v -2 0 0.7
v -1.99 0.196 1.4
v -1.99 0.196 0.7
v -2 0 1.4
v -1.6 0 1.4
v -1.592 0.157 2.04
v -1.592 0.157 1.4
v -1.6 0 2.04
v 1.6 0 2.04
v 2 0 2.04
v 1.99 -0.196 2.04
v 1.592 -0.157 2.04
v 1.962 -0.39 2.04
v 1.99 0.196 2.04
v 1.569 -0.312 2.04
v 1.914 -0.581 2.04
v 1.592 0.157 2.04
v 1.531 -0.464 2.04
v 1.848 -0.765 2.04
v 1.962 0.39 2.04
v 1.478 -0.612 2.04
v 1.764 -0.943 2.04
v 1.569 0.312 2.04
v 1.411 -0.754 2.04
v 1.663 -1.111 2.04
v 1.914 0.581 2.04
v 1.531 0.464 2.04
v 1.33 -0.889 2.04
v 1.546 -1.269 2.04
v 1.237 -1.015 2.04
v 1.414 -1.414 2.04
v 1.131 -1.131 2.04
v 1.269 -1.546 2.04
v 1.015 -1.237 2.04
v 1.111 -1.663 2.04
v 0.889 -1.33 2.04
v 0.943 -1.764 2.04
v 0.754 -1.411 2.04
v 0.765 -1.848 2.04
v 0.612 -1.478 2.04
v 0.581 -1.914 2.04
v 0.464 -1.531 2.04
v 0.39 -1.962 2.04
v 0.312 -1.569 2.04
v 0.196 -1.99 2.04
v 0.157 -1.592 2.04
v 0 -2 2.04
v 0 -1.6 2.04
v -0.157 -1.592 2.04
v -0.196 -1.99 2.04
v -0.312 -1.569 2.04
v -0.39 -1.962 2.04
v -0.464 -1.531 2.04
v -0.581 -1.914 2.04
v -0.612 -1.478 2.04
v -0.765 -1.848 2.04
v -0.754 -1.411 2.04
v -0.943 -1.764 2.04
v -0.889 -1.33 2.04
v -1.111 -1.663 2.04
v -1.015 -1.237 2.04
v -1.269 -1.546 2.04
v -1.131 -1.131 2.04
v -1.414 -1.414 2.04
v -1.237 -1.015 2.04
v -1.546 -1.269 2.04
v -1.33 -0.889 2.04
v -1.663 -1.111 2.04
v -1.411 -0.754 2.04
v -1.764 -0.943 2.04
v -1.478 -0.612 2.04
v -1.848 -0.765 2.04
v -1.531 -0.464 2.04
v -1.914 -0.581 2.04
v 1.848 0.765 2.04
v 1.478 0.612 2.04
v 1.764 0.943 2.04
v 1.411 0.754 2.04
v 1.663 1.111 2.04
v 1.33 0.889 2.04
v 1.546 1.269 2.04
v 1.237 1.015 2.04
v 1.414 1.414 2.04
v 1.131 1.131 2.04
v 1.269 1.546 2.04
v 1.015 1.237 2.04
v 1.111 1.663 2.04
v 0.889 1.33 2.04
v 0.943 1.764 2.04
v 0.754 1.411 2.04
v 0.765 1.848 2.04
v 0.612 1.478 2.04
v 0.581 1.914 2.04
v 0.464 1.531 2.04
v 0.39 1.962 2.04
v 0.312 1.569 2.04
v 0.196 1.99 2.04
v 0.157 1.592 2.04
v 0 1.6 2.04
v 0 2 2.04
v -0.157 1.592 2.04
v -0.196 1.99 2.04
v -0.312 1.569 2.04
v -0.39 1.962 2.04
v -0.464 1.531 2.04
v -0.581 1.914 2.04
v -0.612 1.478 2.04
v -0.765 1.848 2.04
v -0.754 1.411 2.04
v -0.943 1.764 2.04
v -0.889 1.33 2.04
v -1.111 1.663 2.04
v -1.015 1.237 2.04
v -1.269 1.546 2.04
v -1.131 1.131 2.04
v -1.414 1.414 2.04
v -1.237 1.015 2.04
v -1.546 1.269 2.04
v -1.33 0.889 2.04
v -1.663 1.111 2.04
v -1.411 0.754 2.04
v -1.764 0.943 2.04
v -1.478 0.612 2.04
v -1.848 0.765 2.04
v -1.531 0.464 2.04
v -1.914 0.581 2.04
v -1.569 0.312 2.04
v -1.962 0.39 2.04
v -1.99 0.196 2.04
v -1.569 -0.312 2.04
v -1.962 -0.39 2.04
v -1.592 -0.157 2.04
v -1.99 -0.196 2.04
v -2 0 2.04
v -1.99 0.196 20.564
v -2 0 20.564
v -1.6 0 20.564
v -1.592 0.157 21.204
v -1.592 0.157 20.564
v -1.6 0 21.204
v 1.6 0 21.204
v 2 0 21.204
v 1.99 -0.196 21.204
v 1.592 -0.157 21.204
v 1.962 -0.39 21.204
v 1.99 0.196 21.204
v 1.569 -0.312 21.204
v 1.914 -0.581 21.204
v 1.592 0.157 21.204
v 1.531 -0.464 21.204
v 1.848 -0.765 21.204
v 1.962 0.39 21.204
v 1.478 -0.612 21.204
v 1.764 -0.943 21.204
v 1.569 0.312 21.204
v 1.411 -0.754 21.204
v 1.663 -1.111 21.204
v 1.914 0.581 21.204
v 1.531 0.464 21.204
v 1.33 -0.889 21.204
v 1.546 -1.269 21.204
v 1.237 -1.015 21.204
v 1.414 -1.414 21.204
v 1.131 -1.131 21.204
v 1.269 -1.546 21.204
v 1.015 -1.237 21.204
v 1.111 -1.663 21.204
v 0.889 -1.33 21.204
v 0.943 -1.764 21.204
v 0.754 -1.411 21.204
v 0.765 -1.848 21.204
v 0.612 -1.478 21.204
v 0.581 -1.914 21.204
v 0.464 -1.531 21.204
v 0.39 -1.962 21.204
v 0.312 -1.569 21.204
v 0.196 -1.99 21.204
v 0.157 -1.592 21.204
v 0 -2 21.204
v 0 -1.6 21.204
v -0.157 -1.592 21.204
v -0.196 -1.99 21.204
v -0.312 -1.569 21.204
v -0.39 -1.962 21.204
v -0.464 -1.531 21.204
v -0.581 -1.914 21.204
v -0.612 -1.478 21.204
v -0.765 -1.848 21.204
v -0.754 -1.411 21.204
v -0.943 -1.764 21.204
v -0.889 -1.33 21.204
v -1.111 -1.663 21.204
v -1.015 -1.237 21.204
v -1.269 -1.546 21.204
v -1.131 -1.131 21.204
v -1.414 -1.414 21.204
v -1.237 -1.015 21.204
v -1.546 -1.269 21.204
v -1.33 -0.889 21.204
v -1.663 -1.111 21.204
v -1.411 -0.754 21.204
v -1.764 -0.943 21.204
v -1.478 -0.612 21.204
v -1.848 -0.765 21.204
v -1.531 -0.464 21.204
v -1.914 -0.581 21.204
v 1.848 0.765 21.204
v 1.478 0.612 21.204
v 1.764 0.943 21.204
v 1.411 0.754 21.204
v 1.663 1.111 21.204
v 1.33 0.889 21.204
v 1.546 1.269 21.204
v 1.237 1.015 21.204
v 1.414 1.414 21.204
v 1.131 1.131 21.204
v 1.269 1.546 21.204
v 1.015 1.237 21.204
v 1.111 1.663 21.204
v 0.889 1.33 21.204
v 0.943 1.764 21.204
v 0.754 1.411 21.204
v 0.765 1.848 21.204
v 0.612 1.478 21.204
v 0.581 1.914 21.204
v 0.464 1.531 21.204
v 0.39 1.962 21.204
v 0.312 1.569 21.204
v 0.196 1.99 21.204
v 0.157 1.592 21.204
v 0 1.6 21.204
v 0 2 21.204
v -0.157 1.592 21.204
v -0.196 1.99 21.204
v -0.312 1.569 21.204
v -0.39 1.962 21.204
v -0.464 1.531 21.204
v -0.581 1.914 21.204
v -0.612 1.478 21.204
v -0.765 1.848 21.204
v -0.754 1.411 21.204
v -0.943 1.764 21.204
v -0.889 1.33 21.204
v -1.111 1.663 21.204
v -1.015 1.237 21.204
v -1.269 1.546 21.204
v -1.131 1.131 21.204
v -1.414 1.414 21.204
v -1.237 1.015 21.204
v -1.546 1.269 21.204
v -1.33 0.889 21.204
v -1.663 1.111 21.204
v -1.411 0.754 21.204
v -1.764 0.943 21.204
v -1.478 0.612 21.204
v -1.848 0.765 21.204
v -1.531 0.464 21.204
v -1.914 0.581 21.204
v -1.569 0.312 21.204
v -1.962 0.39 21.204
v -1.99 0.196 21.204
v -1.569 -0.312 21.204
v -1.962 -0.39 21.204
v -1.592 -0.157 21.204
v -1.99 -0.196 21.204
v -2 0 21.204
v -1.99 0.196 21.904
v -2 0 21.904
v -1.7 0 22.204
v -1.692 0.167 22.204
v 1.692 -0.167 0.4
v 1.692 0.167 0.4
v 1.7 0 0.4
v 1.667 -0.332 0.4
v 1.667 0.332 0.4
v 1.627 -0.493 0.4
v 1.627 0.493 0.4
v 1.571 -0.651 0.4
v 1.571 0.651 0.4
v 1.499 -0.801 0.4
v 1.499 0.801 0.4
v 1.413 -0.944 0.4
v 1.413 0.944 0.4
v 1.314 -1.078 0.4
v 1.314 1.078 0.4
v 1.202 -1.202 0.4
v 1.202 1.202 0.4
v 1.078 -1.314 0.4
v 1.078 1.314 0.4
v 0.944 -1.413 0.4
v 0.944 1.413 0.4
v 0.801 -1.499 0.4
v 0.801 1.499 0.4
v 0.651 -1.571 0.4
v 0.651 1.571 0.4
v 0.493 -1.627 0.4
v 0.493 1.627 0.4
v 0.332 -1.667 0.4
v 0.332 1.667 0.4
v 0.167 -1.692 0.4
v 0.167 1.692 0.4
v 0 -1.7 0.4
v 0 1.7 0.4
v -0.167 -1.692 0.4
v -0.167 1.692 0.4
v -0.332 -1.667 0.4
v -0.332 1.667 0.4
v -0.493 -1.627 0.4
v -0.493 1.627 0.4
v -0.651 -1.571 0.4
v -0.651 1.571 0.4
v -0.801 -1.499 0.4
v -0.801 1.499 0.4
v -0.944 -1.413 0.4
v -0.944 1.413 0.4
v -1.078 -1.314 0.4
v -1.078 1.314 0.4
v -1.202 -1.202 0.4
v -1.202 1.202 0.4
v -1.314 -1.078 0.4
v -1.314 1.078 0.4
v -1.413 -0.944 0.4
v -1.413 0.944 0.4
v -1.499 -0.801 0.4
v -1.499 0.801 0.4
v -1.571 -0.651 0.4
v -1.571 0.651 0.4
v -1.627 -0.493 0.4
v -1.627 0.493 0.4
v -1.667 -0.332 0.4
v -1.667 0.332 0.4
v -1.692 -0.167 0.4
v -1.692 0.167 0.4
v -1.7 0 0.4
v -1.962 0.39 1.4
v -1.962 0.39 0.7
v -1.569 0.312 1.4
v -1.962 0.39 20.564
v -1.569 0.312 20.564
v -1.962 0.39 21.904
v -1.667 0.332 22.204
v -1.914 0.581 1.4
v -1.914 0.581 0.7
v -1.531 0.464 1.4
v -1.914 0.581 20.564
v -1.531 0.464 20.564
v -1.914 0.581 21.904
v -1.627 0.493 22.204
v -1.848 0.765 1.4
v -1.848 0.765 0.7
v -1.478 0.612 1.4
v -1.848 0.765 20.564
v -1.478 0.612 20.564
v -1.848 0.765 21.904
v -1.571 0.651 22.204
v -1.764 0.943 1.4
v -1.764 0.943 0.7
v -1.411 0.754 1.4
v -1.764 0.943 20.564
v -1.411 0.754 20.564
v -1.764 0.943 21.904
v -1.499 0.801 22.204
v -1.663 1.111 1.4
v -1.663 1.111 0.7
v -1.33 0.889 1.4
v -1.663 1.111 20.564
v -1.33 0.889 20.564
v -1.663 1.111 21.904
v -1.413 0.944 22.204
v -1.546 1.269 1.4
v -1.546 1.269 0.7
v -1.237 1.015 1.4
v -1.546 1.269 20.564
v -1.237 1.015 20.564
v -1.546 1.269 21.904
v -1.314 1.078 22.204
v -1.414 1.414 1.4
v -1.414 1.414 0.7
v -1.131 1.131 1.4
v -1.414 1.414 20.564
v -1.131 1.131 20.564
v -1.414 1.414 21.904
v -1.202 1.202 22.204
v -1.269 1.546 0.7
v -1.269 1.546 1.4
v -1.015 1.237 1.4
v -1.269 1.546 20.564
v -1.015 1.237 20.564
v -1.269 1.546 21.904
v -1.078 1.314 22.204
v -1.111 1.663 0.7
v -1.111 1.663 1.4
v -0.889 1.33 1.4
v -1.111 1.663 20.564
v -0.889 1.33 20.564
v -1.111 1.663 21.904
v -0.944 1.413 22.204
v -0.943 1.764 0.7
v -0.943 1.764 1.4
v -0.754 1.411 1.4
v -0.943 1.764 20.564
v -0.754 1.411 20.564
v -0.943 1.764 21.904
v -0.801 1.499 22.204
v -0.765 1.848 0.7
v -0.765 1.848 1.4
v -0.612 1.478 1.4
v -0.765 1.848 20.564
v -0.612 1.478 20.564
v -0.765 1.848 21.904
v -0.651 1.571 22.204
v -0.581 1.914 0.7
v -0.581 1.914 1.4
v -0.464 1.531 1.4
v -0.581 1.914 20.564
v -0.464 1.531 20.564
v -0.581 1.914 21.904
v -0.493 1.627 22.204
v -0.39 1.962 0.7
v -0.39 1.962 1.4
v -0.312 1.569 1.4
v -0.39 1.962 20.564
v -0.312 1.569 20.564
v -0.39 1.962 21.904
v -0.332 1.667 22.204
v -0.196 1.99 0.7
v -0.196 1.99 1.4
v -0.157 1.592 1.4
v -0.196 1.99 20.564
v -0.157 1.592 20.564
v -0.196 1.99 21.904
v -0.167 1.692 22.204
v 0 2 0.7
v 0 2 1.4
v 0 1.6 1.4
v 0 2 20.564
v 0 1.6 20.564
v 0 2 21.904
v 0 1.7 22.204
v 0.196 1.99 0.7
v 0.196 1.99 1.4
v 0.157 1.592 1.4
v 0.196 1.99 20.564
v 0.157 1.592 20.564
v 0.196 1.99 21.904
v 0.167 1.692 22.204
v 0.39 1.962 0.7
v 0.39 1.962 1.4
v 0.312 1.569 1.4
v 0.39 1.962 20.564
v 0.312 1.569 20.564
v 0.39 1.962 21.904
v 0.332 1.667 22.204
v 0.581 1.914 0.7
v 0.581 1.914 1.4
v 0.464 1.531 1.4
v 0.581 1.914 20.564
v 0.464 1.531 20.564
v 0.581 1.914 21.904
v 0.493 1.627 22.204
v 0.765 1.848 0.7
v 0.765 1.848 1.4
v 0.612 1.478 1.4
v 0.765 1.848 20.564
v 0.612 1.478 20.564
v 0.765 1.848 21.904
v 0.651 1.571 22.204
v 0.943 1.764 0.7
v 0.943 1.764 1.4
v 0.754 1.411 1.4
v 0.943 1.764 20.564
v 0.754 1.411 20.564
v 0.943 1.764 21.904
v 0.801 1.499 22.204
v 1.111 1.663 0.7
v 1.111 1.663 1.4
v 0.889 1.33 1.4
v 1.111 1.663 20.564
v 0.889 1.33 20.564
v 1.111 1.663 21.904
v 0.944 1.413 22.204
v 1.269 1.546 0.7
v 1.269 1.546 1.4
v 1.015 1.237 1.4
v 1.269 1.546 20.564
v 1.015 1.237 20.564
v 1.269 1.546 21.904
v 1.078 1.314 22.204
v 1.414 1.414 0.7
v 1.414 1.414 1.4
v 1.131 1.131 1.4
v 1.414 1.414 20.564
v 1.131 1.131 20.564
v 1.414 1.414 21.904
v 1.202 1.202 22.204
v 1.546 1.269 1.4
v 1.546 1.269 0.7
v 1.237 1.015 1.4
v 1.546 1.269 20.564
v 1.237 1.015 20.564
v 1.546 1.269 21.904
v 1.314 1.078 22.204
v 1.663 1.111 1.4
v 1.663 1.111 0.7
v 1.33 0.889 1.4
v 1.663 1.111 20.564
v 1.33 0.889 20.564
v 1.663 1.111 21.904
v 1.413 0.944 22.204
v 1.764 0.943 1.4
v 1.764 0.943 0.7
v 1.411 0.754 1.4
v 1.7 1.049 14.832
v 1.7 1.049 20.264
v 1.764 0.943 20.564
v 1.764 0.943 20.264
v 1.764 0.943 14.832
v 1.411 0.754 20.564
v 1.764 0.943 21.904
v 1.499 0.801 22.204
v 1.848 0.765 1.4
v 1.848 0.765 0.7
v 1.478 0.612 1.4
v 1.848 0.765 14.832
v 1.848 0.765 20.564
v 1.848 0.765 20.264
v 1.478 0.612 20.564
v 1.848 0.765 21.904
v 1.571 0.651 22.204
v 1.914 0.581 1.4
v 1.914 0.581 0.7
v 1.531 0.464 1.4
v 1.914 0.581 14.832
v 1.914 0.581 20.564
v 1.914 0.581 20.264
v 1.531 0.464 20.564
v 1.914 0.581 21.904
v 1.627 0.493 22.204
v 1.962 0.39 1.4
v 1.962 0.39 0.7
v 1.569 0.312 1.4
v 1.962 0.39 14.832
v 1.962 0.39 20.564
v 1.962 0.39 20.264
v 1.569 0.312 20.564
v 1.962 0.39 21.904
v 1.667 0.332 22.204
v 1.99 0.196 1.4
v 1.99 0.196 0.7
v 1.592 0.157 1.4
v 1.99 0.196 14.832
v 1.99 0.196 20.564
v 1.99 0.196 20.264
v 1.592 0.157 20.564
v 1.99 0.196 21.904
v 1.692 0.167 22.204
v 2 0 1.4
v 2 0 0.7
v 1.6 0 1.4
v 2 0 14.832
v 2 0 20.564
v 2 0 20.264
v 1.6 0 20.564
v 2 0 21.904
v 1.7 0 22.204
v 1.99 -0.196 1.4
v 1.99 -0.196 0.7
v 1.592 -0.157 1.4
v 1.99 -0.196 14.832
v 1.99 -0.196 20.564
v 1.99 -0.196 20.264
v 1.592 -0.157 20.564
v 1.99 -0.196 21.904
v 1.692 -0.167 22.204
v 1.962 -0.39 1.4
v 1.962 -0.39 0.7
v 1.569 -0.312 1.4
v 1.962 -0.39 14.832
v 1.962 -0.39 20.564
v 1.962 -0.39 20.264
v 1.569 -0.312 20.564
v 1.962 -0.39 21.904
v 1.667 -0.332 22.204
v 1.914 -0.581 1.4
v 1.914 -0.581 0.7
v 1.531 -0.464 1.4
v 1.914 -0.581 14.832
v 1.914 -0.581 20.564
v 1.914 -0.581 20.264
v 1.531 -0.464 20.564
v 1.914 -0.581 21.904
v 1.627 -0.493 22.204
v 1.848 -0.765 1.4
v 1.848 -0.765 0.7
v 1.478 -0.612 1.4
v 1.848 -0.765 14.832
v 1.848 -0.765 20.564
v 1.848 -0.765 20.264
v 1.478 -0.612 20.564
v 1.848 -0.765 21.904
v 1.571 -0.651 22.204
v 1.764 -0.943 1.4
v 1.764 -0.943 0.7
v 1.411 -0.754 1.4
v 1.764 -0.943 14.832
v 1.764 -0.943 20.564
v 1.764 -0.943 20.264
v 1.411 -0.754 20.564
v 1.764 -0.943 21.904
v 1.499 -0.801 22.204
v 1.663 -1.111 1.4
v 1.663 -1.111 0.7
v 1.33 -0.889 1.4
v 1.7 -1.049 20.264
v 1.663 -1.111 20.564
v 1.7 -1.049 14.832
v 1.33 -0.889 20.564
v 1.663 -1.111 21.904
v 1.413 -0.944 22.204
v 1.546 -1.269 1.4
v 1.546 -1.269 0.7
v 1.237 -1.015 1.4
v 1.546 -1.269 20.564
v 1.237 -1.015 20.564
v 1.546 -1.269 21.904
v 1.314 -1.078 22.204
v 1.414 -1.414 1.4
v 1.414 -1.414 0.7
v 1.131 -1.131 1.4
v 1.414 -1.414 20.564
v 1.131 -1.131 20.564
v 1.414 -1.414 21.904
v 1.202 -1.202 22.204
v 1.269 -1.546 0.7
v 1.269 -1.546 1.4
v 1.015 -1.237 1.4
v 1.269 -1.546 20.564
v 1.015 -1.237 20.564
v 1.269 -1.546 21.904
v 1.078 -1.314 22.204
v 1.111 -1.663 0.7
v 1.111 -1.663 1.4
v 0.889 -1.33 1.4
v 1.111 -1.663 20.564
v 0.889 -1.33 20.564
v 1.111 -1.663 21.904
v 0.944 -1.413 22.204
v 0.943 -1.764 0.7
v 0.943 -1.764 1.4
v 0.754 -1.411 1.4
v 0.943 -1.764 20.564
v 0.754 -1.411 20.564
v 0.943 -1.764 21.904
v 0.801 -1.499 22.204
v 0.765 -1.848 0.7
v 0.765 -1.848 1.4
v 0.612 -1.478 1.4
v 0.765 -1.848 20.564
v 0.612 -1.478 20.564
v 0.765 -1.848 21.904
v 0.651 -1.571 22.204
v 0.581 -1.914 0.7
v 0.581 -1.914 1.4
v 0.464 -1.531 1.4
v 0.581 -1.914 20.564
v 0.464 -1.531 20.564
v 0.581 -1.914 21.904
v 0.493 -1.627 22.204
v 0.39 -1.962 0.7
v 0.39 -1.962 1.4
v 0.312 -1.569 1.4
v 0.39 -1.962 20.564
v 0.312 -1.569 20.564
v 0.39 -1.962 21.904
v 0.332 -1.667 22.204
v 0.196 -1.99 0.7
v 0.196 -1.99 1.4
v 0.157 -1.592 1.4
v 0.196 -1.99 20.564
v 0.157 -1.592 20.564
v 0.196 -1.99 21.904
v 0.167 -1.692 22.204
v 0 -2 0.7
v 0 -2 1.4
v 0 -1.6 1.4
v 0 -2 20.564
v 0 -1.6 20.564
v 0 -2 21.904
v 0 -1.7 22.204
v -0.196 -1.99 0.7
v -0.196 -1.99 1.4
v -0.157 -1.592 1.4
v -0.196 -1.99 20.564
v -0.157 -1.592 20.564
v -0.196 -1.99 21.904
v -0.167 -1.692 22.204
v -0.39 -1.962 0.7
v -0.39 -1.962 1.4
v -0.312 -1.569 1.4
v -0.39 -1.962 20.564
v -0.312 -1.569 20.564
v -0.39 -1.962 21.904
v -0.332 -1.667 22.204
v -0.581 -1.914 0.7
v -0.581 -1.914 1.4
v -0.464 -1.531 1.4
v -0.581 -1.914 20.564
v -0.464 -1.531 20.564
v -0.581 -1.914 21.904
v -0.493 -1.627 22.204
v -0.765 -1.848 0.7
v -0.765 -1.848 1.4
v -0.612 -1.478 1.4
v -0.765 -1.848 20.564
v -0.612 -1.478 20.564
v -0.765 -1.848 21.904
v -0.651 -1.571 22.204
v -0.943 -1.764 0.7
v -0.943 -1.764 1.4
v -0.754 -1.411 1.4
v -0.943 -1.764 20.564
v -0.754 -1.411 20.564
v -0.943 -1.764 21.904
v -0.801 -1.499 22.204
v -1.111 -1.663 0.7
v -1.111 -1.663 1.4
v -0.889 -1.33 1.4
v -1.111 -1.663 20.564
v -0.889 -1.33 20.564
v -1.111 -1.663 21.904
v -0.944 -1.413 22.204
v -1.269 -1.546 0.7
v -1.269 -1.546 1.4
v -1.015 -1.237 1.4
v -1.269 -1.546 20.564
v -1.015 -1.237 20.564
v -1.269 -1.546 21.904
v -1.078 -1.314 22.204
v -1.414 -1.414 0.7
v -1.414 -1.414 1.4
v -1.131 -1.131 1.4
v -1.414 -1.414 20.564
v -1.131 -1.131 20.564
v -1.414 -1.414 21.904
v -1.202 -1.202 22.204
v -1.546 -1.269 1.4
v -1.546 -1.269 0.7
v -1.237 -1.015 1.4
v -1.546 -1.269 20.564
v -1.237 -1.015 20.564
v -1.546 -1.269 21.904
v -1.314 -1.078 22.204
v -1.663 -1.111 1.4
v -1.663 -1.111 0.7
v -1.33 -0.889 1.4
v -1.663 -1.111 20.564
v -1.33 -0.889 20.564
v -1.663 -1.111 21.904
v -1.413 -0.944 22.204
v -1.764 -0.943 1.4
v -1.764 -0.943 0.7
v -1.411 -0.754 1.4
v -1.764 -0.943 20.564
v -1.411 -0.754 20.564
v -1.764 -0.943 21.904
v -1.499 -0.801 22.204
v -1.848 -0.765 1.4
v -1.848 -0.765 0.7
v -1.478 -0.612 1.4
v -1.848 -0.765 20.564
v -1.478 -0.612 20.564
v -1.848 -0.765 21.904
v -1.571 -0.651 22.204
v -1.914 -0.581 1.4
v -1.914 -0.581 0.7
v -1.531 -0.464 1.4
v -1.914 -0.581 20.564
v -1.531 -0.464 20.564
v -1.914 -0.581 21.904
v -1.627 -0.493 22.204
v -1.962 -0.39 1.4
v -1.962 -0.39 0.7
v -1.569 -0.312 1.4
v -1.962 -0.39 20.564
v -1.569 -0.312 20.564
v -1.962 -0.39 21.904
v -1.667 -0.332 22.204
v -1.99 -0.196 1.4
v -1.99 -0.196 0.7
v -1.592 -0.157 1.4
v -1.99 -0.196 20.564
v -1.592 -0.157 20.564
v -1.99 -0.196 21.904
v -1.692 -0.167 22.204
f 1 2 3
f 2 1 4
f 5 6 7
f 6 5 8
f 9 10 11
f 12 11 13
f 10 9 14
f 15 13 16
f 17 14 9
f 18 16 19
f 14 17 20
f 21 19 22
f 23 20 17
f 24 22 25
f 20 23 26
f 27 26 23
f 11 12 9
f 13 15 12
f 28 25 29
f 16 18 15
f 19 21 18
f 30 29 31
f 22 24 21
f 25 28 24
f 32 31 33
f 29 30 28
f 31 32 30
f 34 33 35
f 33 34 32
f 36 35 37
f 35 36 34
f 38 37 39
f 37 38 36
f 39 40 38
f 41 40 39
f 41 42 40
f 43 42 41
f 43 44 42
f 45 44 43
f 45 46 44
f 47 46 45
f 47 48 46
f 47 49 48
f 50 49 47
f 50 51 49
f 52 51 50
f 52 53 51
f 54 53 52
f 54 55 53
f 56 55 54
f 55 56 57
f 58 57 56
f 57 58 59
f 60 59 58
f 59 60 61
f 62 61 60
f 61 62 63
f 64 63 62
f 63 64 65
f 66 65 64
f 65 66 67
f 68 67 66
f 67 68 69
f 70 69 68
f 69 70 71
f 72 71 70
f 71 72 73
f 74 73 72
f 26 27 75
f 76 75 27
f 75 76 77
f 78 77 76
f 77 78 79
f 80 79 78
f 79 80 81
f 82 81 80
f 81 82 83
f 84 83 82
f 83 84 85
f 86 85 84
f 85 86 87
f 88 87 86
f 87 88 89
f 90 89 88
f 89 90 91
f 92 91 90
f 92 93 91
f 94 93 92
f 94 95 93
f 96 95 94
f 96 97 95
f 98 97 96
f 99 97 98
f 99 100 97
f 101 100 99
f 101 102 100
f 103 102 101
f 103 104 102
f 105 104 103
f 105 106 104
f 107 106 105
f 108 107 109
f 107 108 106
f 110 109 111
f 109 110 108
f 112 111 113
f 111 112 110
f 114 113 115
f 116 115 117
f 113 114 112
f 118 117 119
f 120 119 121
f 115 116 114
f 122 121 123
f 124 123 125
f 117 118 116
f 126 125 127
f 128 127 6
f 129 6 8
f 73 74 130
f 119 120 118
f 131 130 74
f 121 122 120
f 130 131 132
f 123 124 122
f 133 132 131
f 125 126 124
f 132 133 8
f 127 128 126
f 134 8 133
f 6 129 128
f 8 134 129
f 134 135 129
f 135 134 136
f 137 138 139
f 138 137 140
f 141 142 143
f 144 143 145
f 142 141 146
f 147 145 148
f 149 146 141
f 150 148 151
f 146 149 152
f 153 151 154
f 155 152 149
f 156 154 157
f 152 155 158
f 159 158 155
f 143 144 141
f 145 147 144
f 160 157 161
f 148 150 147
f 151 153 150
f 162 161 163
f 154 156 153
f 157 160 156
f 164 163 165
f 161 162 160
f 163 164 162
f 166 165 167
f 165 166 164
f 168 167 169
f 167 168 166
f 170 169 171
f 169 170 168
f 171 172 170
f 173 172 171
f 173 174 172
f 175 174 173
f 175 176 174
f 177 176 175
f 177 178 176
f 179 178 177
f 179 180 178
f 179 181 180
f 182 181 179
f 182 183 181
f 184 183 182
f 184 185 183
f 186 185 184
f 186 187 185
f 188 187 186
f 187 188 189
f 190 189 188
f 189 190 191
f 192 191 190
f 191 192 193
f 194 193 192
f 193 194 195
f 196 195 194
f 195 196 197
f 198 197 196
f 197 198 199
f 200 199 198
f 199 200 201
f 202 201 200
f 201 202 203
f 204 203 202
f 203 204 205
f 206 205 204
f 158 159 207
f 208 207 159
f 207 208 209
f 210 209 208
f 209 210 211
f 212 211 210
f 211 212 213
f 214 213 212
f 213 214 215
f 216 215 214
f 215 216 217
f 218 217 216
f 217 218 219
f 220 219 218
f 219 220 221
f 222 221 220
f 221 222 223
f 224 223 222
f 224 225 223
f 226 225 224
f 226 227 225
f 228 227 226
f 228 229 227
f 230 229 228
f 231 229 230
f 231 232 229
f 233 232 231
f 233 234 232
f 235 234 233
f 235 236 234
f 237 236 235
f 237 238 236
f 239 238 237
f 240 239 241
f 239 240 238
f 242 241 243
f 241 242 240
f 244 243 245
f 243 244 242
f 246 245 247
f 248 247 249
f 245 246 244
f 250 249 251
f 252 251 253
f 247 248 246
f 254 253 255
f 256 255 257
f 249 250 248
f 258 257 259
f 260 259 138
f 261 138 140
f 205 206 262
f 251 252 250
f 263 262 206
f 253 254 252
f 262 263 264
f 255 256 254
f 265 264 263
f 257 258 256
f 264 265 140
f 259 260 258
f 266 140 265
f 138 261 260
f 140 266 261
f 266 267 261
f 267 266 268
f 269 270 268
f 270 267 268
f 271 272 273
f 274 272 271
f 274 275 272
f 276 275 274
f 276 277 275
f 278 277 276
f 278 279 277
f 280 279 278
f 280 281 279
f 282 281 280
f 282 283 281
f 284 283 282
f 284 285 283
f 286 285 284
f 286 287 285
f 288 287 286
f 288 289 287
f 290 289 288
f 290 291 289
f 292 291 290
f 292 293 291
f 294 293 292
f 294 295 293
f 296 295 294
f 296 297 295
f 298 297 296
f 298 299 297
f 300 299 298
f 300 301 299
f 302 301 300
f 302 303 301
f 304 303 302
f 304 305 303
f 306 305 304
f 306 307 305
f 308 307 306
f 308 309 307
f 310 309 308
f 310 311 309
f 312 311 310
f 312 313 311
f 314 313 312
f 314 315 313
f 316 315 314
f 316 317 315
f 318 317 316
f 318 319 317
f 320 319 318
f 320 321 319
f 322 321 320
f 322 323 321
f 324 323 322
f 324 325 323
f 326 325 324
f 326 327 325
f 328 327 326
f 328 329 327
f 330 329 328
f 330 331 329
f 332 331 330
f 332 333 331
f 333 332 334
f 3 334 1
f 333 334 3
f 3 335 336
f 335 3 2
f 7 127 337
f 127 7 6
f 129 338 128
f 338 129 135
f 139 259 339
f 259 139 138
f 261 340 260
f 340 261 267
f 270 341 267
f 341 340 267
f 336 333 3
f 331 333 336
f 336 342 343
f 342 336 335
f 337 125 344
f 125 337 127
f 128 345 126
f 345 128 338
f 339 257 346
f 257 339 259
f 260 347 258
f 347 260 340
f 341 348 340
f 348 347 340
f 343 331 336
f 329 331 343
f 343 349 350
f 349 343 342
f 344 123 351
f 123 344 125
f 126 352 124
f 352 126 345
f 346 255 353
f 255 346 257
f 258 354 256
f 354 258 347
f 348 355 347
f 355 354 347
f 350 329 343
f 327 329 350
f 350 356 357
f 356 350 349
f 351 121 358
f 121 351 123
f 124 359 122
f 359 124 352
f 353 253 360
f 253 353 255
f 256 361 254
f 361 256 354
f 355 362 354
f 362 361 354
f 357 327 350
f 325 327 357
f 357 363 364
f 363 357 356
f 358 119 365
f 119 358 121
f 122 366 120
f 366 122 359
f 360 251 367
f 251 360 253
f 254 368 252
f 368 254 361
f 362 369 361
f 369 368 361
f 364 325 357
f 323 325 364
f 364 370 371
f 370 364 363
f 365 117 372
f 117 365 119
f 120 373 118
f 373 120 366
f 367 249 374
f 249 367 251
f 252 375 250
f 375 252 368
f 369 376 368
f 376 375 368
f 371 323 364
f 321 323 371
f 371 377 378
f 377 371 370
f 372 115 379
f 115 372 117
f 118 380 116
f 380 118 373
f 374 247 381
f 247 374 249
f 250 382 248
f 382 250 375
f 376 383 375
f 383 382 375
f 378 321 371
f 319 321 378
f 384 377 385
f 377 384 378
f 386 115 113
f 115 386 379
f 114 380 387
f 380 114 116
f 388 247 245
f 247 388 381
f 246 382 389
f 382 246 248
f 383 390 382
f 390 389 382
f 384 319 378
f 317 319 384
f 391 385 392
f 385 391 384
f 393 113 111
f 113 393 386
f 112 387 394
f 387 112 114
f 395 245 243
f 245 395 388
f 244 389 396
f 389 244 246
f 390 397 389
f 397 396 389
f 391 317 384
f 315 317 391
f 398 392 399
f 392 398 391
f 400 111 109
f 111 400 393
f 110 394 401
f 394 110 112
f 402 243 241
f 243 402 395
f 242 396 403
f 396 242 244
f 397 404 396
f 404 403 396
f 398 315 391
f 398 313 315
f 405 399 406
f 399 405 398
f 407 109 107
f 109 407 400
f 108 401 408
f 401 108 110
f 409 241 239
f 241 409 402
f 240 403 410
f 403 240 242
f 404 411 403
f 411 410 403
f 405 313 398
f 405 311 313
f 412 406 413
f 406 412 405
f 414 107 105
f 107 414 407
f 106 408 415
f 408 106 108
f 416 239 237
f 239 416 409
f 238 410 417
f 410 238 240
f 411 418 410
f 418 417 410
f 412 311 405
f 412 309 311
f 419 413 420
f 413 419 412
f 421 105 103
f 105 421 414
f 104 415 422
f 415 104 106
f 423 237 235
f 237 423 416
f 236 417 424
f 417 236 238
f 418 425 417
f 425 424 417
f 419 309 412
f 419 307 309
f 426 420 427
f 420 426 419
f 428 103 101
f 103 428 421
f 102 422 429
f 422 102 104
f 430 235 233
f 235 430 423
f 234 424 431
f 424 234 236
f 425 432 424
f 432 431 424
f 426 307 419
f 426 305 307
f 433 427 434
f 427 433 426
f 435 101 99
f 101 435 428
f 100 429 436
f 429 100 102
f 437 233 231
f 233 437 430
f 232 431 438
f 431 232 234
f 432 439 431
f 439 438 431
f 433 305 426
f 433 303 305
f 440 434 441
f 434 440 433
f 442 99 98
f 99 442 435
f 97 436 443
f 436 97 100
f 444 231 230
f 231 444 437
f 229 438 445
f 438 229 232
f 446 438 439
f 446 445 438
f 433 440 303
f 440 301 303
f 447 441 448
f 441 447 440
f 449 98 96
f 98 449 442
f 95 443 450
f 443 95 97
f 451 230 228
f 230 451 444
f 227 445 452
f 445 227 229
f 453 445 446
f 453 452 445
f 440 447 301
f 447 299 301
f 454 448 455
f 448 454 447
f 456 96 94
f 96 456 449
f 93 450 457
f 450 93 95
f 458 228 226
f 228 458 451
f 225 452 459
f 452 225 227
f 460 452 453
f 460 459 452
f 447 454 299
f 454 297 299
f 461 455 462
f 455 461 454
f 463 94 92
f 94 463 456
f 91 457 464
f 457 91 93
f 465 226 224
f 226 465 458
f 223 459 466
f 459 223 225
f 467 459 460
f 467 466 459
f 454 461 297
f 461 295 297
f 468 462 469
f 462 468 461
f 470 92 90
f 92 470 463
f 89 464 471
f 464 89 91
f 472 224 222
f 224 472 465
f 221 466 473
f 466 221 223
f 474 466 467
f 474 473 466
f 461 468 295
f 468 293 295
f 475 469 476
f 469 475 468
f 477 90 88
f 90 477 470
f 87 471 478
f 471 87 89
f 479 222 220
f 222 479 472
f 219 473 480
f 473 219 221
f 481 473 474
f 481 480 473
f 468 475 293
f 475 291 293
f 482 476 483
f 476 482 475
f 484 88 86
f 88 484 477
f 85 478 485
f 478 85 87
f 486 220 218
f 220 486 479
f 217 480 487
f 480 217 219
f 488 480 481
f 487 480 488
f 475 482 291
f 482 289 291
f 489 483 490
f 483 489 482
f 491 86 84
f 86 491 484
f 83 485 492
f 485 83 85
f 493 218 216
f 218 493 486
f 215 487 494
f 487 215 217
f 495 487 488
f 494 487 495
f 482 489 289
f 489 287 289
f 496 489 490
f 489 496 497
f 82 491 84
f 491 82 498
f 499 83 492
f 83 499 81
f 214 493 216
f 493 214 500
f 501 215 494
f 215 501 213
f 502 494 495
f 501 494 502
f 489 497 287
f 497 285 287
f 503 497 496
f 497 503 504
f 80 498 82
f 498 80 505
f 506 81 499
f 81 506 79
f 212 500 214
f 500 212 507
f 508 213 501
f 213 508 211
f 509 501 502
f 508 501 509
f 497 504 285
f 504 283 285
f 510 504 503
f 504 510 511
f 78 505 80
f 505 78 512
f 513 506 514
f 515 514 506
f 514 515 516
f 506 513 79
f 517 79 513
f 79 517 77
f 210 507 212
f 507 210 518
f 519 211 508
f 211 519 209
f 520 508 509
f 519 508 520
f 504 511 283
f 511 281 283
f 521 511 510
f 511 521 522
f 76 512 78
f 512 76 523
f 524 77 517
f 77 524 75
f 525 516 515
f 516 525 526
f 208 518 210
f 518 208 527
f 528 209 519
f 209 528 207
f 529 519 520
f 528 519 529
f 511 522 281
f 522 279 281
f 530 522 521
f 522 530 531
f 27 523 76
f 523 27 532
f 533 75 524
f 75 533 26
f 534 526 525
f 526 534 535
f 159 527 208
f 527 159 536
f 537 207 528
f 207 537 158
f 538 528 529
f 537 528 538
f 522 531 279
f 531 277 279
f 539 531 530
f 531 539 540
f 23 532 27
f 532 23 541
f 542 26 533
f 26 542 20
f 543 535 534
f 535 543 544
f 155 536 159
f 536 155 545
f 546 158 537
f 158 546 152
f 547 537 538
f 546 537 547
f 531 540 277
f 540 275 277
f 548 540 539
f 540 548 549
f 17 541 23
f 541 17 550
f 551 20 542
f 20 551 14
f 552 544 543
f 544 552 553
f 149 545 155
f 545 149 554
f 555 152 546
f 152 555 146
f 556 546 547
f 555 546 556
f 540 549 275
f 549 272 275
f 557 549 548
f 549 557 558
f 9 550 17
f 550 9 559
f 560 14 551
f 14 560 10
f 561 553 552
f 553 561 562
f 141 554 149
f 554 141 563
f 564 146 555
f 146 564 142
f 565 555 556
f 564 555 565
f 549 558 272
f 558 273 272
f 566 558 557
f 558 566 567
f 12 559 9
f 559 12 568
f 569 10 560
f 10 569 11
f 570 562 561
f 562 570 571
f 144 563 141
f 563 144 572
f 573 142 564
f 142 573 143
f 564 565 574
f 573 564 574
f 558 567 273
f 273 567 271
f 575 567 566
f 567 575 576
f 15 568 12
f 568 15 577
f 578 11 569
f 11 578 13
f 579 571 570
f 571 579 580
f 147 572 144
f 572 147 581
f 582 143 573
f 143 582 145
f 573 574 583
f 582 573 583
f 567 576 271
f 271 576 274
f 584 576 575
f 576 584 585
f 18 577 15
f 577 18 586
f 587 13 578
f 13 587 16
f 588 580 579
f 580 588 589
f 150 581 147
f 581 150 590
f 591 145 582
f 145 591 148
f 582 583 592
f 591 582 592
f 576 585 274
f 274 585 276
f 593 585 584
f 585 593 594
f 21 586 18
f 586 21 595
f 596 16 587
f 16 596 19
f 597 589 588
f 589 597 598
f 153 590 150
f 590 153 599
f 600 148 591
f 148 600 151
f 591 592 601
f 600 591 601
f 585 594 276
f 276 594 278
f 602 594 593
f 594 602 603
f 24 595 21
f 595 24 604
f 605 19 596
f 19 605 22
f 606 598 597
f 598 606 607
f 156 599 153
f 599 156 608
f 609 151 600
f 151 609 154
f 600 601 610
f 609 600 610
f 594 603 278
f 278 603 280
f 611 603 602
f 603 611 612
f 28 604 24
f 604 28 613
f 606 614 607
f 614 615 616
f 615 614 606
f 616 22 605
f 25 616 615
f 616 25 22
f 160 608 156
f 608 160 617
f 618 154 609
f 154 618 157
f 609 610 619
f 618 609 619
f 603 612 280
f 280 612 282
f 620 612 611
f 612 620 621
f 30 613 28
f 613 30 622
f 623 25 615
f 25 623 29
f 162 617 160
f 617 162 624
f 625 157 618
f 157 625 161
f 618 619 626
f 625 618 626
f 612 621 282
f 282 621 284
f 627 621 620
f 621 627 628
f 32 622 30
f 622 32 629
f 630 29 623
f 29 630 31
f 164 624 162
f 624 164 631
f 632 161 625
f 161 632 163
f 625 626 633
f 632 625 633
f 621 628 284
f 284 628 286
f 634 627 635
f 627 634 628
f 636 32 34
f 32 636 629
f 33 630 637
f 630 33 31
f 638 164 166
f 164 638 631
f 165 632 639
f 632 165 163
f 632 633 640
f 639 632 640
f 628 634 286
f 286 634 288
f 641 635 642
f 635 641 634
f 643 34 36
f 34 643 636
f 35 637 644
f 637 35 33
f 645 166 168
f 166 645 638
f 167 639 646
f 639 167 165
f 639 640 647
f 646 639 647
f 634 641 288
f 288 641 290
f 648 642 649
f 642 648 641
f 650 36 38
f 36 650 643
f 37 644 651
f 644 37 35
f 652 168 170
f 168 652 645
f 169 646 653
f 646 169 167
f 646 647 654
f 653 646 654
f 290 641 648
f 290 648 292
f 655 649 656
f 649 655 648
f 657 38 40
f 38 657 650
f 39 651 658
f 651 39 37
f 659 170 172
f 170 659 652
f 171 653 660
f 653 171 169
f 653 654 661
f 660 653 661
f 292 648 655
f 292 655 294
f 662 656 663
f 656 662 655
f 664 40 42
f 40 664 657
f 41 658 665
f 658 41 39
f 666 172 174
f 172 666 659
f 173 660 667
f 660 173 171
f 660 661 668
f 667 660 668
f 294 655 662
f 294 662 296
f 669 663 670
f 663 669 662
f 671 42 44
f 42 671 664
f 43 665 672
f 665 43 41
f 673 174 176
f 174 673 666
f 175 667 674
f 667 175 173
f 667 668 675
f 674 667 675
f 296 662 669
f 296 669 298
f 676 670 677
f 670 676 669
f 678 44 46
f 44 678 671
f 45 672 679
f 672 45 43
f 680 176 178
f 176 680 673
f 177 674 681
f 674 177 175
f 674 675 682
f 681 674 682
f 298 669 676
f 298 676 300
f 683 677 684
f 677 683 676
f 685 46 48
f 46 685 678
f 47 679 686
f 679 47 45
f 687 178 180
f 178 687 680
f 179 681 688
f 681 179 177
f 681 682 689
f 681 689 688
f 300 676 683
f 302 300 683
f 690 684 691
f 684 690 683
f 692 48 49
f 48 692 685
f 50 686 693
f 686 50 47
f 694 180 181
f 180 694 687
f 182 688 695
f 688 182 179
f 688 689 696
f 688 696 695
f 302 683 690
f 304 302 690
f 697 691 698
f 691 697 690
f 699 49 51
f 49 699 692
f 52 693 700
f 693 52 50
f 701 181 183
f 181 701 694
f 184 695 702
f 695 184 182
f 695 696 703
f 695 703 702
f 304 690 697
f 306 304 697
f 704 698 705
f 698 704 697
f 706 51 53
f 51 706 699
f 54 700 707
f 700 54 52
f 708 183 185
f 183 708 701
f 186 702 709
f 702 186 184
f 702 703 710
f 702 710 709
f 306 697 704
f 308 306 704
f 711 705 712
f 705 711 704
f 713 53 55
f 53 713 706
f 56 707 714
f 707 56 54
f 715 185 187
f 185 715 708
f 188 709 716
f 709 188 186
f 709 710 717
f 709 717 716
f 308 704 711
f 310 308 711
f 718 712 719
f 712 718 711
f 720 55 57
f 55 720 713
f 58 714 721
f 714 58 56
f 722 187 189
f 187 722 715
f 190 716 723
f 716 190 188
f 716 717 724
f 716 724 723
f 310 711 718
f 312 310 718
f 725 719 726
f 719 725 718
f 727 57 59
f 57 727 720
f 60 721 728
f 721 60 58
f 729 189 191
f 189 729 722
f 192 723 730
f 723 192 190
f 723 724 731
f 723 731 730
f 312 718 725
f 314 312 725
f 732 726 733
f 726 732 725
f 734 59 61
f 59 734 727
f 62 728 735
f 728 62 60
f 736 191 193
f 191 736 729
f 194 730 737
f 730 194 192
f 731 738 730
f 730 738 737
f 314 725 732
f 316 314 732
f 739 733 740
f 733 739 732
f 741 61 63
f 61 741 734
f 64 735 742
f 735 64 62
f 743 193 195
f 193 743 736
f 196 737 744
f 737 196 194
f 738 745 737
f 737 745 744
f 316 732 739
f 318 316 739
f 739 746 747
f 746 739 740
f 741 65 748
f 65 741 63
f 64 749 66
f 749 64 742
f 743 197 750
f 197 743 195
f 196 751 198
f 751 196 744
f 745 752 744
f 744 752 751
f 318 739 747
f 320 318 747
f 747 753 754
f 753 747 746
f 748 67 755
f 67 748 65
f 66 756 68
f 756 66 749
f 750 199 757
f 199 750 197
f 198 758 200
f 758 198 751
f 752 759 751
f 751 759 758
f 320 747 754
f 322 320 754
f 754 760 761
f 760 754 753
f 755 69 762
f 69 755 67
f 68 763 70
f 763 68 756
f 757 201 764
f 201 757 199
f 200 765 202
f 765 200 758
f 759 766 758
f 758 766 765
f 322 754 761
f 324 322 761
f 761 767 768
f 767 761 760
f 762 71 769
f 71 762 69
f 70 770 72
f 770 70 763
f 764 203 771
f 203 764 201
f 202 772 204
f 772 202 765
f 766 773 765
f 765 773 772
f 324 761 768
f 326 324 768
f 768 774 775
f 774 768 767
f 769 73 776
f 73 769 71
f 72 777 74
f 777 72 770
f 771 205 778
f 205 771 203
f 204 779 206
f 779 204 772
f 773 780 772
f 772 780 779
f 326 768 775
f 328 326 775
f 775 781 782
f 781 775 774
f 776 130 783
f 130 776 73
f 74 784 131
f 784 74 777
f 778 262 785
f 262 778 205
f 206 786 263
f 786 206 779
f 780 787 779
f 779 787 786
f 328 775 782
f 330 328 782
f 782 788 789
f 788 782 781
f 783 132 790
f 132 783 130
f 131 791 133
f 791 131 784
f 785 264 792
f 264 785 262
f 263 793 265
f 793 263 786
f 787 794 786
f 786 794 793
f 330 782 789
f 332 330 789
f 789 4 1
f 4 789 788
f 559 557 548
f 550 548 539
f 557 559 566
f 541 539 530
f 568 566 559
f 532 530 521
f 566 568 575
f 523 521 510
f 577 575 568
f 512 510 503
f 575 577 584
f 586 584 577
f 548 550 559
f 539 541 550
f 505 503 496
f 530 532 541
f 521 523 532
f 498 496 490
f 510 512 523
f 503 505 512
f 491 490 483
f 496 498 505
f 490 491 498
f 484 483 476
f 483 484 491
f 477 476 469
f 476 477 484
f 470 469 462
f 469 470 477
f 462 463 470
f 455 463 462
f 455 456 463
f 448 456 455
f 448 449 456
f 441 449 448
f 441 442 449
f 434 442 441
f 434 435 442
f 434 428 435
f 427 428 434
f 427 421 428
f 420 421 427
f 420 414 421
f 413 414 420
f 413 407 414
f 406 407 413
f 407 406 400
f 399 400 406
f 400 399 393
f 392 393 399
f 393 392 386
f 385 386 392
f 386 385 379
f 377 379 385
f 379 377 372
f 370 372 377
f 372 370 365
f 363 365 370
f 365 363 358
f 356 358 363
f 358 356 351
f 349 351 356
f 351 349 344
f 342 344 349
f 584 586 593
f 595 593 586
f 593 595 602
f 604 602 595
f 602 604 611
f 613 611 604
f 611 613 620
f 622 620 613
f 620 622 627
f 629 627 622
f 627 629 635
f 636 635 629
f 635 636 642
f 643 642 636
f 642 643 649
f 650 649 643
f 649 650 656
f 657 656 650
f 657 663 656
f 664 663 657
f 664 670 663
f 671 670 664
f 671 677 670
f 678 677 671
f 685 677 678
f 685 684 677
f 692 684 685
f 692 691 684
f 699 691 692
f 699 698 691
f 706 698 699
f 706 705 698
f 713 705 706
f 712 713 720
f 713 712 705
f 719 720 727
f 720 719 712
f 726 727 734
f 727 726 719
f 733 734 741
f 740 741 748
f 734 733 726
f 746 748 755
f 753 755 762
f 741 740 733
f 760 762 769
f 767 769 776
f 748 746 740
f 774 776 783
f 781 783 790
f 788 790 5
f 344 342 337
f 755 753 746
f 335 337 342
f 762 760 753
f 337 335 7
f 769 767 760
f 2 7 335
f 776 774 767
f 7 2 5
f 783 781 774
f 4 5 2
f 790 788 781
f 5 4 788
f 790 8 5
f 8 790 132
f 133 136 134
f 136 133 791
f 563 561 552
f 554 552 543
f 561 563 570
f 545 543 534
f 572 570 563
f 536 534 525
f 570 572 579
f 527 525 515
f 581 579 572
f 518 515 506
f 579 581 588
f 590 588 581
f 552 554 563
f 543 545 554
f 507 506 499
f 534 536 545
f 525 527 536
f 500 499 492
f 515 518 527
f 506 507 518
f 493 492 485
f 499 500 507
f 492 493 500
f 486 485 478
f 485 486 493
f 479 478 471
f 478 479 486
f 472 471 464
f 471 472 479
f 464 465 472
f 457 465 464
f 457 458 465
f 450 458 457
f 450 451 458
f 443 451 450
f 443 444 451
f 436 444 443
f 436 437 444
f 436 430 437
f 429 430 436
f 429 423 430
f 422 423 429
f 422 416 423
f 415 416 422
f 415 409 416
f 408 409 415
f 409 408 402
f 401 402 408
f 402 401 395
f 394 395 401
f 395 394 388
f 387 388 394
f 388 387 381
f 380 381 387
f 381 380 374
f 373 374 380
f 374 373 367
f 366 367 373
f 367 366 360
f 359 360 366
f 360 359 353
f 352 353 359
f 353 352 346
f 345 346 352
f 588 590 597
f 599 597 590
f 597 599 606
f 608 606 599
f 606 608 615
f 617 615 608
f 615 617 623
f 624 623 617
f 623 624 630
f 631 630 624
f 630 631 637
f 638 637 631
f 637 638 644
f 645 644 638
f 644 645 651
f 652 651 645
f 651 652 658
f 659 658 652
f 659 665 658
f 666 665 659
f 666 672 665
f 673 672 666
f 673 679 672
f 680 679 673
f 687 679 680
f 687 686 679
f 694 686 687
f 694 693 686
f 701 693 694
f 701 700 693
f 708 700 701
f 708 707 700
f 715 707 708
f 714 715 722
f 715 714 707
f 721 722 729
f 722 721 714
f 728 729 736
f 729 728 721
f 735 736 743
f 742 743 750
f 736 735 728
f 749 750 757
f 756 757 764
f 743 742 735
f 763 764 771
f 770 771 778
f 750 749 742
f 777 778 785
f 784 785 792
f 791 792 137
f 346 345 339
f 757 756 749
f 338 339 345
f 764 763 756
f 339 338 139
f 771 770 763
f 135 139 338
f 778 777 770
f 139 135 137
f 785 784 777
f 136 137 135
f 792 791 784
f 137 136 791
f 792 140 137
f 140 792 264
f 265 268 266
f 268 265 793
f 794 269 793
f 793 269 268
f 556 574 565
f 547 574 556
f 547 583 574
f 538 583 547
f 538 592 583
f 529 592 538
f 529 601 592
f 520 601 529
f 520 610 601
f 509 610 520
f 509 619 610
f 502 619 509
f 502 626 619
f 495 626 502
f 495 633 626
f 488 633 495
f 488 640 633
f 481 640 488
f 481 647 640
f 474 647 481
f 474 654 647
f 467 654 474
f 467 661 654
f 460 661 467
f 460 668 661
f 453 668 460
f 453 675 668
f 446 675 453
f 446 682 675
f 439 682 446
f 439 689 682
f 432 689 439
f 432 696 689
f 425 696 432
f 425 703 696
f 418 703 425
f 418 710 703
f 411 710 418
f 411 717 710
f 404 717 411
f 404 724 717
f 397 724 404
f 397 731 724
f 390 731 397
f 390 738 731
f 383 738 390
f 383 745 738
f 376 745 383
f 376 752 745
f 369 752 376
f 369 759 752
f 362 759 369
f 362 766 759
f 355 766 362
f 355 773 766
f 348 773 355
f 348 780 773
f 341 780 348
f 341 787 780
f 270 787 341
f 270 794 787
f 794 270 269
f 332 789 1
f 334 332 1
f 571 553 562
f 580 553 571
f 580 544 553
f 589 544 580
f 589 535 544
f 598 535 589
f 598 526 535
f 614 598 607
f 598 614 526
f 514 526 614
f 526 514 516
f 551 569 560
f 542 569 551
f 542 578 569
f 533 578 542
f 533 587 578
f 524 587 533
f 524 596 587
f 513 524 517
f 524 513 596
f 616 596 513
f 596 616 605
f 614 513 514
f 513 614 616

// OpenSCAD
// DS-I · eje (M6). Generado por motor/fabricacion/gen_cad.py
include <ds_i_motor_params.scad>
include <motor_lib.scad>
shaft_part();
